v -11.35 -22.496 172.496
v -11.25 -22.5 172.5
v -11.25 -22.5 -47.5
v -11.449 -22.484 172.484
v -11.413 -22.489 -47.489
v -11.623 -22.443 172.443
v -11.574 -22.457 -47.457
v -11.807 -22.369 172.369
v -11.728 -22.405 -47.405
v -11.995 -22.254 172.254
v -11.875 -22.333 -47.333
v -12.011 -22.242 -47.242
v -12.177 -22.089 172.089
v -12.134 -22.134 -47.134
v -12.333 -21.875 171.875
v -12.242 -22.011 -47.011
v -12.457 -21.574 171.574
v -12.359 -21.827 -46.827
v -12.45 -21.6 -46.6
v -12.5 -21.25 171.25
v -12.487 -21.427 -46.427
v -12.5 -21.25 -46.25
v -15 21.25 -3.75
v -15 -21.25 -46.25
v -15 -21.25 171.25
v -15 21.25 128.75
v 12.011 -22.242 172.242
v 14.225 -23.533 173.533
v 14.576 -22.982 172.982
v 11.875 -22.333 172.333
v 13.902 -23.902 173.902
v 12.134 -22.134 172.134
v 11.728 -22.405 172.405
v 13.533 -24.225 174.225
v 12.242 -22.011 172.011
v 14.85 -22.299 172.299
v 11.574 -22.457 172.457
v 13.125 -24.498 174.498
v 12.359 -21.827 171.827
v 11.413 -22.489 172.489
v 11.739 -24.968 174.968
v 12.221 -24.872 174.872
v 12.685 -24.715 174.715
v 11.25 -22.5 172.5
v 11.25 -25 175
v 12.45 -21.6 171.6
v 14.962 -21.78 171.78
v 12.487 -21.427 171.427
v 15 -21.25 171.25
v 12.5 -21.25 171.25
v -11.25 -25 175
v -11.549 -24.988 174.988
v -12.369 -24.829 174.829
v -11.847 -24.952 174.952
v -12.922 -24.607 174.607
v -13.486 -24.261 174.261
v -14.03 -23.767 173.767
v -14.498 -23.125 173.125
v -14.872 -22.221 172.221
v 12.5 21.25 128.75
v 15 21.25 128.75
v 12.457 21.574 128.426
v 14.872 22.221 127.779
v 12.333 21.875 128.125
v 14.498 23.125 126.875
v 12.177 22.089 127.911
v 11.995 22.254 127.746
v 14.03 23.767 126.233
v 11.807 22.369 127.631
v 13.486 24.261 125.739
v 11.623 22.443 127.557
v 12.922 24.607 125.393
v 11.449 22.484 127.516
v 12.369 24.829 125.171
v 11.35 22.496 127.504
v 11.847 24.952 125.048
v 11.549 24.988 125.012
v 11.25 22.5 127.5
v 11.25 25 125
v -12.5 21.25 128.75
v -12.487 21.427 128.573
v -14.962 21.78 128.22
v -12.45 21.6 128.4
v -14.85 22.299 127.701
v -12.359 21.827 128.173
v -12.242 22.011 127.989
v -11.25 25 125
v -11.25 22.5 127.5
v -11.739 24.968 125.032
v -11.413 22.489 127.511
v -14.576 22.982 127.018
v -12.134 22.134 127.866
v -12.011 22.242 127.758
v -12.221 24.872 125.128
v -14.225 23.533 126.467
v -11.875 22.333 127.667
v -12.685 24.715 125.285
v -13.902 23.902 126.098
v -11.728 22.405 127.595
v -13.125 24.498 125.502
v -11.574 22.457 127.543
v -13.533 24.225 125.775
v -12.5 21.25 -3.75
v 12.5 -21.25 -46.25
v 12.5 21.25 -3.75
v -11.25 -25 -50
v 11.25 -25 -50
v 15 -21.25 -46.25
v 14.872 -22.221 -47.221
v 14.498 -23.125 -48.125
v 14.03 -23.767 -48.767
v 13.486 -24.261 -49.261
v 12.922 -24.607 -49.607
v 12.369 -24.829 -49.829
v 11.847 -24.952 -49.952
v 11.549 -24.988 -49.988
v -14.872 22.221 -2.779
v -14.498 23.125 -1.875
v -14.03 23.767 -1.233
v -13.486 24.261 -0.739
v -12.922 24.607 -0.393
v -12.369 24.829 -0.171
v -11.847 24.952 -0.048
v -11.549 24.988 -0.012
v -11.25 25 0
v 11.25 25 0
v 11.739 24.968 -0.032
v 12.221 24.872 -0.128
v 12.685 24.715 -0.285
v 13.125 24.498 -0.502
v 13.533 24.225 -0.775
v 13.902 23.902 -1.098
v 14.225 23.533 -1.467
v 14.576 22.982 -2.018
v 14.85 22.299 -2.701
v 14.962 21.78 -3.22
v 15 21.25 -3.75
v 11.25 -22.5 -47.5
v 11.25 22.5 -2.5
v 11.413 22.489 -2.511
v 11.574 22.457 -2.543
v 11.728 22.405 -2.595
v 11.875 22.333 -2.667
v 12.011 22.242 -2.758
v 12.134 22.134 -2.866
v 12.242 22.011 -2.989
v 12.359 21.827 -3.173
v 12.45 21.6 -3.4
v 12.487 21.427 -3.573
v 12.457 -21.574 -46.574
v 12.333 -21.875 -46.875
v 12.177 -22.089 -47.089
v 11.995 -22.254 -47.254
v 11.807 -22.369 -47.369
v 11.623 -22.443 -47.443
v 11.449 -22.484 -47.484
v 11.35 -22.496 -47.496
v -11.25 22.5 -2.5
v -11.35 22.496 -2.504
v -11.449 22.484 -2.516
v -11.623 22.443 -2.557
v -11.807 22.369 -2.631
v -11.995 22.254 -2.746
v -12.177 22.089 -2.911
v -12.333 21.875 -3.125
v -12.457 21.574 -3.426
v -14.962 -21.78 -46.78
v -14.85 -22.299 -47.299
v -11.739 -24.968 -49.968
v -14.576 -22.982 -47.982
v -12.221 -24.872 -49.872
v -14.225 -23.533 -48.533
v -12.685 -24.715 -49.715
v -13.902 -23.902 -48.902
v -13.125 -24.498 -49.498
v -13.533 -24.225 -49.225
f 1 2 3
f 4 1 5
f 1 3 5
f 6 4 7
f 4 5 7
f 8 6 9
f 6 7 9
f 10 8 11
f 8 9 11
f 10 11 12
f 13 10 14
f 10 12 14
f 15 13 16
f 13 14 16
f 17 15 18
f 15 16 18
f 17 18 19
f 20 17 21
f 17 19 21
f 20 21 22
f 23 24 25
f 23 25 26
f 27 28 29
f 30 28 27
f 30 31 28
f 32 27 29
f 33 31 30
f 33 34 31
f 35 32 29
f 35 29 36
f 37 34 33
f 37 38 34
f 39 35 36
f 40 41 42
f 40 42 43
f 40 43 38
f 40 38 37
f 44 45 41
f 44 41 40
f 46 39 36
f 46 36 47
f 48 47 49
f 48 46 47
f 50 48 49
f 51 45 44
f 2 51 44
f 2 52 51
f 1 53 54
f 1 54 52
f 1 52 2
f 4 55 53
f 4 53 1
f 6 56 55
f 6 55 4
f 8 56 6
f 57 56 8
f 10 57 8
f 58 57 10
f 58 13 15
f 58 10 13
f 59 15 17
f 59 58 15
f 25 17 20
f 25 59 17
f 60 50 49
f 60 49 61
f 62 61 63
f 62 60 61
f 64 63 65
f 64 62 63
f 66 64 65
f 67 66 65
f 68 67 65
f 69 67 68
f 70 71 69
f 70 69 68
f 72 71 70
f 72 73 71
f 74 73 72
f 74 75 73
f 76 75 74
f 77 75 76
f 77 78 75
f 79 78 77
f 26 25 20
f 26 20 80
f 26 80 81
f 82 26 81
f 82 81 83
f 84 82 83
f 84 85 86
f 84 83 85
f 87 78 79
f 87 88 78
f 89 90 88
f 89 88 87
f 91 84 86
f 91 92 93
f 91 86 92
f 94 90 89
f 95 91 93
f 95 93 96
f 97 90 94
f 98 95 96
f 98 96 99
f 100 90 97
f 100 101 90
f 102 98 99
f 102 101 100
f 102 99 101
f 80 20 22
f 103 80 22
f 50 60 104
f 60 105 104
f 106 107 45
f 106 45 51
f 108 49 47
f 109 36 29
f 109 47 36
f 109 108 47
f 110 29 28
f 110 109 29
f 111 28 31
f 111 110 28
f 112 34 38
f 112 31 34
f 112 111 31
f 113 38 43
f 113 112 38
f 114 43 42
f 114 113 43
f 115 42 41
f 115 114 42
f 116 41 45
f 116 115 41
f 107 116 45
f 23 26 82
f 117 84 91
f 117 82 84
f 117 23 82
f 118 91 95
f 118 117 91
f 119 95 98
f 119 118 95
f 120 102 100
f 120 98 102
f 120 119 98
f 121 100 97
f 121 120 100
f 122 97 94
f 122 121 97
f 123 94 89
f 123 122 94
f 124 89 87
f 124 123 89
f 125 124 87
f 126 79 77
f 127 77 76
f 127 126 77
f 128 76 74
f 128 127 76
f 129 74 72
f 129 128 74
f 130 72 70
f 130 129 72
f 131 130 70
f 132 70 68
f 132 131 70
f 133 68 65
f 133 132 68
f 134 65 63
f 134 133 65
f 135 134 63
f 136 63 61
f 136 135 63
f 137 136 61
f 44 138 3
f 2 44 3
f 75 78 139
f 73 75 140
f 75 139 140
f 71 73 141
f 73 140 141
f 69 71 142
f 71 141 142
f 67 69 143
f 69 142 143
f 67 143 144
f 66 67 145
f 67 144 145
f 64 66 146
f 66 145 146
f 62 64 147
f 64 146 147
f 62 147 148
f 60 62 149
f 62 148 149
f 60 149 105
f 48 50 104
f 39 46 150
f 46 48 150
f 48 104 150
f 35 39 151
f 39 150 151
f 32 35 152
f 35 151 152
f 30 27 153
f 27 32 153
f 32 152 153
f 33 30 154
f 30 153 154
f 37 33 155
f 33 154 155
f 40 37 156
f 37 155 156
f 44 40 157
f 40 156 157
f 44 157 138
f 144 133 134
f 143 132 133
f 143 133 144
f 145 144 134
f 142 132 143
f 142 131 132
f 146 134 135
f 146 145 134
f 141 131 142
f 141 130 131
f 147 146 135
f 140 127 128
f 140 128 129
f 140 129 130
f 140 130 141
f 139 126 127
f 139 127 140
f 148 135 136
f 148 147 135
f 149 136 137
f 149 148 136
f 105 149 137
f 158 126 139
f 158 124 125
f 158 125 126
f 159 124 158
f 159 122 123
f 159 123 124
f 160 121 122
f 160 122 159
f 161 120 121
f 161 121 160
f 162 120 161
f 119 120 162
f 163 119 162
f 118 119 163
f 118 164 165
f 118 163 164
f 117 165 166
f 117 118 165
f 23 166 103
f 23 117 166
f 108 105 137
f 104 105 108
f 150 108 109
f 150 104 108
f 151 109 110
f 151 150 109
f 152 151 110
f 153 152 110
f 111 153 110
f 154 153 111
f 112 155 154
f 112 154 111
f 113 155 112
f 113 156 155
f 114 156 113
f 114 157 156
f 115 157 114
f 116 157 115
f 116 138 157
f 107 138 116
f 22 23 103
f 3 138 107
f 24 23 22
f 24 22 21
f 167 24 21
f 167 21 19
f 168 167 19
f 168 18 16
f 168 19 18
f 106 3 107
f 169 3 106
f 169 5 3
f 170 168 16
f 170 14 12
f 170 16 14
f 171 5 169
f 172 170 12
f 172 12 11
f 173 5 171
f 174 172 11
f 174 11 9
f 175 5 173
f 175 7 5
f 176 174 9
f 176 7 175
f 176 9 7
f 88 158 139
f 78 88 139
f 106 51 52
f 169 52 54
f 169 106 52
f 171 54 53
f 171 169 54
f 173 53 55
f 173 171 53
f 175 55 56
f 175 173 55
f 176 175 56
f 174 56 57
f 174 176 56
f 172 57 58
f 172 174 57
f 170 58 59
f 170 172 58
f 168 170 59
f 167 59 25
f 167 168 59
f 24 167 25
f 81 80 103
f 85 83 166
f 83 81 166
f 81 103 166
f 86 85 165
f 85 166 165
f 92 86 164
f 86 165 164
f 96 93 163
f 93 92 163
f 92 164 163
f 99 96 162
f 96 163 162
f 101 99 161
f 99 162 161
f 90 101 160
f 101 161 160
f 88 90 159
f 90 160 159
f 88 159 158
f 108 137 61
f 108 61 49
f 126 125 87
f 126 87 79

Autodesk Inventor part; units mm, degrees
ref_plane "Plano inicial" through (0, 0, -50) normal (0, 0, 1) x (1, 0, 0)
ref_plane "Plano final" through (0, 0, 175) normal (0, 0, 1) x (1, 0, 0)
sketch "Esboço" plane through (0, 0, 0) normal (0, 0, 1) x (1, 0, 0)
  line L0 (-15, -21.25) -> (-15, 21.25)
  line L1 (-11.25, 25) -> (11.25, 25)
  line L2 (15, 21.25) -> (15, -21.25)
  line L3 (11.25, -25) -> (-11.25, -25)
  arc A0 (-15, -21.25) -> (-11.25, -25) centre (-11.25, -21.25) ccw
  arc A1 (-11.25, 25) -> (-15, 21.25) centre (-11.25, 21.25) ccw
  arc A2 (15, 21.25) -> (11.25, 25) centre (11.25, 21.25) ccw
  arc A3 (11.25, -25) -> (15, -21.25) centre (11.25, -21.25) ccw
  arc A4 (-11.25, 22.5) -> (-12.5, 21.25) centre (-11.25, 21.25) ccw
  line L4 (-11.25, 22.5) -> (11.25, 22.5)
  arc A5 (12.5, 21.25) -> (11.25, 22.5) centre (11.25, 21.25) ccw
  line L5 (12.5, 21.25) -> (12.5, -21.25)
  arc A6 (11.25, -22.5) -> (12.5, -21.25) centre (11.25, -21.25) ccw
  line L6 (11.25, -22.5) -> (-11.25, -22.5)
  arc A7 (-12.5, -21.25) -> (-11.25, -22.5) centre (-11.25, -21.25) ccw
  line L7 (-12.5, -21.25) -> (-12.5, 21.25)
  line L8 (0, 36.0873) -> (0, -36.0873) construction
  line L9 (-22.0873, 0) -> (22.0873, 0) construction
  dimension "d7" = 3.75
  dimension "d10" = 50
  dimension "d11" = 30
  dimension "d12" = 2.5
  dimension "d15" = 25
  dimension "d16" = 15
extrude "Corpo" add sketch "Esboço" along normal up to surface (225 mm away) from surface at -50
sketch "Sketch3" plane through (0, 0, 0) normal (0, 0, 1) x (1, 0, 0)
  line L0 (0, 0) -> (10, 0)
ref_plane "Work Plane3" through (0, 0, 0) normal (0, -1, 0) x (1, 0, 0)
sketch "Sketch4" plane through (0, 0, 0) normal (0, -1, 0) x (1, 0, 0)
  line L0 (-2, -50) -> (12, -50)
  line L1 (-2, 175) -> (12, 175)
  dimension "d18" = 225
ref_plane "Plano de trabalho5" through (-15, -10, 175) normal (0, 0, 1) x (1, 0, 0)
split "Dividir2" plane through (-15, -10, 175) removes the side toward (0, 0, 1)
ref_plane "Plano de trabalho6" through (-2.5, -25, -50) normal (0, 0.7071, -0.7071) x (1, 0, 0)
split "Dividir3" plane through (-2.5, -25, -50) removes the side toward (0, 0.7071, -0.7071)
ref_plane "Plano de trabalho7" through (0, -25, 175) normal (0, 0.7071, 0.7071) x (1, 0, 0)
split "Dividir4" plane through (0, -25, 175) removes the side toward (0, 0.7071, 0.7071)
equation "\"d7\" = G_IR"
equation "\"d10\" = G_H"
equation "\"d11\" = G_W"
equation "\"d12\" = G_T"
equation "\"d15\" = 0.5 * d10"
equation "\"d16\" = 0.5 * d11"
equation "\"d3\" = G_L"
equation "\"G_W\" = 30"
equation "\"G_H\" = 50"
equation "\"G_T\" = 2.5"
equation "\"G_IR\" = 3.75"
equation "\"G_L\" = d18"
equation "\"G_OFFSET_END\" = 0"
equation "\"d14\" = G_OFFSET_END + B_L"
equation "\"B_L\" = 175"
properties part number "ISO 12633-2 - 50x30x2.5 - 225" material "Aço, suave"
